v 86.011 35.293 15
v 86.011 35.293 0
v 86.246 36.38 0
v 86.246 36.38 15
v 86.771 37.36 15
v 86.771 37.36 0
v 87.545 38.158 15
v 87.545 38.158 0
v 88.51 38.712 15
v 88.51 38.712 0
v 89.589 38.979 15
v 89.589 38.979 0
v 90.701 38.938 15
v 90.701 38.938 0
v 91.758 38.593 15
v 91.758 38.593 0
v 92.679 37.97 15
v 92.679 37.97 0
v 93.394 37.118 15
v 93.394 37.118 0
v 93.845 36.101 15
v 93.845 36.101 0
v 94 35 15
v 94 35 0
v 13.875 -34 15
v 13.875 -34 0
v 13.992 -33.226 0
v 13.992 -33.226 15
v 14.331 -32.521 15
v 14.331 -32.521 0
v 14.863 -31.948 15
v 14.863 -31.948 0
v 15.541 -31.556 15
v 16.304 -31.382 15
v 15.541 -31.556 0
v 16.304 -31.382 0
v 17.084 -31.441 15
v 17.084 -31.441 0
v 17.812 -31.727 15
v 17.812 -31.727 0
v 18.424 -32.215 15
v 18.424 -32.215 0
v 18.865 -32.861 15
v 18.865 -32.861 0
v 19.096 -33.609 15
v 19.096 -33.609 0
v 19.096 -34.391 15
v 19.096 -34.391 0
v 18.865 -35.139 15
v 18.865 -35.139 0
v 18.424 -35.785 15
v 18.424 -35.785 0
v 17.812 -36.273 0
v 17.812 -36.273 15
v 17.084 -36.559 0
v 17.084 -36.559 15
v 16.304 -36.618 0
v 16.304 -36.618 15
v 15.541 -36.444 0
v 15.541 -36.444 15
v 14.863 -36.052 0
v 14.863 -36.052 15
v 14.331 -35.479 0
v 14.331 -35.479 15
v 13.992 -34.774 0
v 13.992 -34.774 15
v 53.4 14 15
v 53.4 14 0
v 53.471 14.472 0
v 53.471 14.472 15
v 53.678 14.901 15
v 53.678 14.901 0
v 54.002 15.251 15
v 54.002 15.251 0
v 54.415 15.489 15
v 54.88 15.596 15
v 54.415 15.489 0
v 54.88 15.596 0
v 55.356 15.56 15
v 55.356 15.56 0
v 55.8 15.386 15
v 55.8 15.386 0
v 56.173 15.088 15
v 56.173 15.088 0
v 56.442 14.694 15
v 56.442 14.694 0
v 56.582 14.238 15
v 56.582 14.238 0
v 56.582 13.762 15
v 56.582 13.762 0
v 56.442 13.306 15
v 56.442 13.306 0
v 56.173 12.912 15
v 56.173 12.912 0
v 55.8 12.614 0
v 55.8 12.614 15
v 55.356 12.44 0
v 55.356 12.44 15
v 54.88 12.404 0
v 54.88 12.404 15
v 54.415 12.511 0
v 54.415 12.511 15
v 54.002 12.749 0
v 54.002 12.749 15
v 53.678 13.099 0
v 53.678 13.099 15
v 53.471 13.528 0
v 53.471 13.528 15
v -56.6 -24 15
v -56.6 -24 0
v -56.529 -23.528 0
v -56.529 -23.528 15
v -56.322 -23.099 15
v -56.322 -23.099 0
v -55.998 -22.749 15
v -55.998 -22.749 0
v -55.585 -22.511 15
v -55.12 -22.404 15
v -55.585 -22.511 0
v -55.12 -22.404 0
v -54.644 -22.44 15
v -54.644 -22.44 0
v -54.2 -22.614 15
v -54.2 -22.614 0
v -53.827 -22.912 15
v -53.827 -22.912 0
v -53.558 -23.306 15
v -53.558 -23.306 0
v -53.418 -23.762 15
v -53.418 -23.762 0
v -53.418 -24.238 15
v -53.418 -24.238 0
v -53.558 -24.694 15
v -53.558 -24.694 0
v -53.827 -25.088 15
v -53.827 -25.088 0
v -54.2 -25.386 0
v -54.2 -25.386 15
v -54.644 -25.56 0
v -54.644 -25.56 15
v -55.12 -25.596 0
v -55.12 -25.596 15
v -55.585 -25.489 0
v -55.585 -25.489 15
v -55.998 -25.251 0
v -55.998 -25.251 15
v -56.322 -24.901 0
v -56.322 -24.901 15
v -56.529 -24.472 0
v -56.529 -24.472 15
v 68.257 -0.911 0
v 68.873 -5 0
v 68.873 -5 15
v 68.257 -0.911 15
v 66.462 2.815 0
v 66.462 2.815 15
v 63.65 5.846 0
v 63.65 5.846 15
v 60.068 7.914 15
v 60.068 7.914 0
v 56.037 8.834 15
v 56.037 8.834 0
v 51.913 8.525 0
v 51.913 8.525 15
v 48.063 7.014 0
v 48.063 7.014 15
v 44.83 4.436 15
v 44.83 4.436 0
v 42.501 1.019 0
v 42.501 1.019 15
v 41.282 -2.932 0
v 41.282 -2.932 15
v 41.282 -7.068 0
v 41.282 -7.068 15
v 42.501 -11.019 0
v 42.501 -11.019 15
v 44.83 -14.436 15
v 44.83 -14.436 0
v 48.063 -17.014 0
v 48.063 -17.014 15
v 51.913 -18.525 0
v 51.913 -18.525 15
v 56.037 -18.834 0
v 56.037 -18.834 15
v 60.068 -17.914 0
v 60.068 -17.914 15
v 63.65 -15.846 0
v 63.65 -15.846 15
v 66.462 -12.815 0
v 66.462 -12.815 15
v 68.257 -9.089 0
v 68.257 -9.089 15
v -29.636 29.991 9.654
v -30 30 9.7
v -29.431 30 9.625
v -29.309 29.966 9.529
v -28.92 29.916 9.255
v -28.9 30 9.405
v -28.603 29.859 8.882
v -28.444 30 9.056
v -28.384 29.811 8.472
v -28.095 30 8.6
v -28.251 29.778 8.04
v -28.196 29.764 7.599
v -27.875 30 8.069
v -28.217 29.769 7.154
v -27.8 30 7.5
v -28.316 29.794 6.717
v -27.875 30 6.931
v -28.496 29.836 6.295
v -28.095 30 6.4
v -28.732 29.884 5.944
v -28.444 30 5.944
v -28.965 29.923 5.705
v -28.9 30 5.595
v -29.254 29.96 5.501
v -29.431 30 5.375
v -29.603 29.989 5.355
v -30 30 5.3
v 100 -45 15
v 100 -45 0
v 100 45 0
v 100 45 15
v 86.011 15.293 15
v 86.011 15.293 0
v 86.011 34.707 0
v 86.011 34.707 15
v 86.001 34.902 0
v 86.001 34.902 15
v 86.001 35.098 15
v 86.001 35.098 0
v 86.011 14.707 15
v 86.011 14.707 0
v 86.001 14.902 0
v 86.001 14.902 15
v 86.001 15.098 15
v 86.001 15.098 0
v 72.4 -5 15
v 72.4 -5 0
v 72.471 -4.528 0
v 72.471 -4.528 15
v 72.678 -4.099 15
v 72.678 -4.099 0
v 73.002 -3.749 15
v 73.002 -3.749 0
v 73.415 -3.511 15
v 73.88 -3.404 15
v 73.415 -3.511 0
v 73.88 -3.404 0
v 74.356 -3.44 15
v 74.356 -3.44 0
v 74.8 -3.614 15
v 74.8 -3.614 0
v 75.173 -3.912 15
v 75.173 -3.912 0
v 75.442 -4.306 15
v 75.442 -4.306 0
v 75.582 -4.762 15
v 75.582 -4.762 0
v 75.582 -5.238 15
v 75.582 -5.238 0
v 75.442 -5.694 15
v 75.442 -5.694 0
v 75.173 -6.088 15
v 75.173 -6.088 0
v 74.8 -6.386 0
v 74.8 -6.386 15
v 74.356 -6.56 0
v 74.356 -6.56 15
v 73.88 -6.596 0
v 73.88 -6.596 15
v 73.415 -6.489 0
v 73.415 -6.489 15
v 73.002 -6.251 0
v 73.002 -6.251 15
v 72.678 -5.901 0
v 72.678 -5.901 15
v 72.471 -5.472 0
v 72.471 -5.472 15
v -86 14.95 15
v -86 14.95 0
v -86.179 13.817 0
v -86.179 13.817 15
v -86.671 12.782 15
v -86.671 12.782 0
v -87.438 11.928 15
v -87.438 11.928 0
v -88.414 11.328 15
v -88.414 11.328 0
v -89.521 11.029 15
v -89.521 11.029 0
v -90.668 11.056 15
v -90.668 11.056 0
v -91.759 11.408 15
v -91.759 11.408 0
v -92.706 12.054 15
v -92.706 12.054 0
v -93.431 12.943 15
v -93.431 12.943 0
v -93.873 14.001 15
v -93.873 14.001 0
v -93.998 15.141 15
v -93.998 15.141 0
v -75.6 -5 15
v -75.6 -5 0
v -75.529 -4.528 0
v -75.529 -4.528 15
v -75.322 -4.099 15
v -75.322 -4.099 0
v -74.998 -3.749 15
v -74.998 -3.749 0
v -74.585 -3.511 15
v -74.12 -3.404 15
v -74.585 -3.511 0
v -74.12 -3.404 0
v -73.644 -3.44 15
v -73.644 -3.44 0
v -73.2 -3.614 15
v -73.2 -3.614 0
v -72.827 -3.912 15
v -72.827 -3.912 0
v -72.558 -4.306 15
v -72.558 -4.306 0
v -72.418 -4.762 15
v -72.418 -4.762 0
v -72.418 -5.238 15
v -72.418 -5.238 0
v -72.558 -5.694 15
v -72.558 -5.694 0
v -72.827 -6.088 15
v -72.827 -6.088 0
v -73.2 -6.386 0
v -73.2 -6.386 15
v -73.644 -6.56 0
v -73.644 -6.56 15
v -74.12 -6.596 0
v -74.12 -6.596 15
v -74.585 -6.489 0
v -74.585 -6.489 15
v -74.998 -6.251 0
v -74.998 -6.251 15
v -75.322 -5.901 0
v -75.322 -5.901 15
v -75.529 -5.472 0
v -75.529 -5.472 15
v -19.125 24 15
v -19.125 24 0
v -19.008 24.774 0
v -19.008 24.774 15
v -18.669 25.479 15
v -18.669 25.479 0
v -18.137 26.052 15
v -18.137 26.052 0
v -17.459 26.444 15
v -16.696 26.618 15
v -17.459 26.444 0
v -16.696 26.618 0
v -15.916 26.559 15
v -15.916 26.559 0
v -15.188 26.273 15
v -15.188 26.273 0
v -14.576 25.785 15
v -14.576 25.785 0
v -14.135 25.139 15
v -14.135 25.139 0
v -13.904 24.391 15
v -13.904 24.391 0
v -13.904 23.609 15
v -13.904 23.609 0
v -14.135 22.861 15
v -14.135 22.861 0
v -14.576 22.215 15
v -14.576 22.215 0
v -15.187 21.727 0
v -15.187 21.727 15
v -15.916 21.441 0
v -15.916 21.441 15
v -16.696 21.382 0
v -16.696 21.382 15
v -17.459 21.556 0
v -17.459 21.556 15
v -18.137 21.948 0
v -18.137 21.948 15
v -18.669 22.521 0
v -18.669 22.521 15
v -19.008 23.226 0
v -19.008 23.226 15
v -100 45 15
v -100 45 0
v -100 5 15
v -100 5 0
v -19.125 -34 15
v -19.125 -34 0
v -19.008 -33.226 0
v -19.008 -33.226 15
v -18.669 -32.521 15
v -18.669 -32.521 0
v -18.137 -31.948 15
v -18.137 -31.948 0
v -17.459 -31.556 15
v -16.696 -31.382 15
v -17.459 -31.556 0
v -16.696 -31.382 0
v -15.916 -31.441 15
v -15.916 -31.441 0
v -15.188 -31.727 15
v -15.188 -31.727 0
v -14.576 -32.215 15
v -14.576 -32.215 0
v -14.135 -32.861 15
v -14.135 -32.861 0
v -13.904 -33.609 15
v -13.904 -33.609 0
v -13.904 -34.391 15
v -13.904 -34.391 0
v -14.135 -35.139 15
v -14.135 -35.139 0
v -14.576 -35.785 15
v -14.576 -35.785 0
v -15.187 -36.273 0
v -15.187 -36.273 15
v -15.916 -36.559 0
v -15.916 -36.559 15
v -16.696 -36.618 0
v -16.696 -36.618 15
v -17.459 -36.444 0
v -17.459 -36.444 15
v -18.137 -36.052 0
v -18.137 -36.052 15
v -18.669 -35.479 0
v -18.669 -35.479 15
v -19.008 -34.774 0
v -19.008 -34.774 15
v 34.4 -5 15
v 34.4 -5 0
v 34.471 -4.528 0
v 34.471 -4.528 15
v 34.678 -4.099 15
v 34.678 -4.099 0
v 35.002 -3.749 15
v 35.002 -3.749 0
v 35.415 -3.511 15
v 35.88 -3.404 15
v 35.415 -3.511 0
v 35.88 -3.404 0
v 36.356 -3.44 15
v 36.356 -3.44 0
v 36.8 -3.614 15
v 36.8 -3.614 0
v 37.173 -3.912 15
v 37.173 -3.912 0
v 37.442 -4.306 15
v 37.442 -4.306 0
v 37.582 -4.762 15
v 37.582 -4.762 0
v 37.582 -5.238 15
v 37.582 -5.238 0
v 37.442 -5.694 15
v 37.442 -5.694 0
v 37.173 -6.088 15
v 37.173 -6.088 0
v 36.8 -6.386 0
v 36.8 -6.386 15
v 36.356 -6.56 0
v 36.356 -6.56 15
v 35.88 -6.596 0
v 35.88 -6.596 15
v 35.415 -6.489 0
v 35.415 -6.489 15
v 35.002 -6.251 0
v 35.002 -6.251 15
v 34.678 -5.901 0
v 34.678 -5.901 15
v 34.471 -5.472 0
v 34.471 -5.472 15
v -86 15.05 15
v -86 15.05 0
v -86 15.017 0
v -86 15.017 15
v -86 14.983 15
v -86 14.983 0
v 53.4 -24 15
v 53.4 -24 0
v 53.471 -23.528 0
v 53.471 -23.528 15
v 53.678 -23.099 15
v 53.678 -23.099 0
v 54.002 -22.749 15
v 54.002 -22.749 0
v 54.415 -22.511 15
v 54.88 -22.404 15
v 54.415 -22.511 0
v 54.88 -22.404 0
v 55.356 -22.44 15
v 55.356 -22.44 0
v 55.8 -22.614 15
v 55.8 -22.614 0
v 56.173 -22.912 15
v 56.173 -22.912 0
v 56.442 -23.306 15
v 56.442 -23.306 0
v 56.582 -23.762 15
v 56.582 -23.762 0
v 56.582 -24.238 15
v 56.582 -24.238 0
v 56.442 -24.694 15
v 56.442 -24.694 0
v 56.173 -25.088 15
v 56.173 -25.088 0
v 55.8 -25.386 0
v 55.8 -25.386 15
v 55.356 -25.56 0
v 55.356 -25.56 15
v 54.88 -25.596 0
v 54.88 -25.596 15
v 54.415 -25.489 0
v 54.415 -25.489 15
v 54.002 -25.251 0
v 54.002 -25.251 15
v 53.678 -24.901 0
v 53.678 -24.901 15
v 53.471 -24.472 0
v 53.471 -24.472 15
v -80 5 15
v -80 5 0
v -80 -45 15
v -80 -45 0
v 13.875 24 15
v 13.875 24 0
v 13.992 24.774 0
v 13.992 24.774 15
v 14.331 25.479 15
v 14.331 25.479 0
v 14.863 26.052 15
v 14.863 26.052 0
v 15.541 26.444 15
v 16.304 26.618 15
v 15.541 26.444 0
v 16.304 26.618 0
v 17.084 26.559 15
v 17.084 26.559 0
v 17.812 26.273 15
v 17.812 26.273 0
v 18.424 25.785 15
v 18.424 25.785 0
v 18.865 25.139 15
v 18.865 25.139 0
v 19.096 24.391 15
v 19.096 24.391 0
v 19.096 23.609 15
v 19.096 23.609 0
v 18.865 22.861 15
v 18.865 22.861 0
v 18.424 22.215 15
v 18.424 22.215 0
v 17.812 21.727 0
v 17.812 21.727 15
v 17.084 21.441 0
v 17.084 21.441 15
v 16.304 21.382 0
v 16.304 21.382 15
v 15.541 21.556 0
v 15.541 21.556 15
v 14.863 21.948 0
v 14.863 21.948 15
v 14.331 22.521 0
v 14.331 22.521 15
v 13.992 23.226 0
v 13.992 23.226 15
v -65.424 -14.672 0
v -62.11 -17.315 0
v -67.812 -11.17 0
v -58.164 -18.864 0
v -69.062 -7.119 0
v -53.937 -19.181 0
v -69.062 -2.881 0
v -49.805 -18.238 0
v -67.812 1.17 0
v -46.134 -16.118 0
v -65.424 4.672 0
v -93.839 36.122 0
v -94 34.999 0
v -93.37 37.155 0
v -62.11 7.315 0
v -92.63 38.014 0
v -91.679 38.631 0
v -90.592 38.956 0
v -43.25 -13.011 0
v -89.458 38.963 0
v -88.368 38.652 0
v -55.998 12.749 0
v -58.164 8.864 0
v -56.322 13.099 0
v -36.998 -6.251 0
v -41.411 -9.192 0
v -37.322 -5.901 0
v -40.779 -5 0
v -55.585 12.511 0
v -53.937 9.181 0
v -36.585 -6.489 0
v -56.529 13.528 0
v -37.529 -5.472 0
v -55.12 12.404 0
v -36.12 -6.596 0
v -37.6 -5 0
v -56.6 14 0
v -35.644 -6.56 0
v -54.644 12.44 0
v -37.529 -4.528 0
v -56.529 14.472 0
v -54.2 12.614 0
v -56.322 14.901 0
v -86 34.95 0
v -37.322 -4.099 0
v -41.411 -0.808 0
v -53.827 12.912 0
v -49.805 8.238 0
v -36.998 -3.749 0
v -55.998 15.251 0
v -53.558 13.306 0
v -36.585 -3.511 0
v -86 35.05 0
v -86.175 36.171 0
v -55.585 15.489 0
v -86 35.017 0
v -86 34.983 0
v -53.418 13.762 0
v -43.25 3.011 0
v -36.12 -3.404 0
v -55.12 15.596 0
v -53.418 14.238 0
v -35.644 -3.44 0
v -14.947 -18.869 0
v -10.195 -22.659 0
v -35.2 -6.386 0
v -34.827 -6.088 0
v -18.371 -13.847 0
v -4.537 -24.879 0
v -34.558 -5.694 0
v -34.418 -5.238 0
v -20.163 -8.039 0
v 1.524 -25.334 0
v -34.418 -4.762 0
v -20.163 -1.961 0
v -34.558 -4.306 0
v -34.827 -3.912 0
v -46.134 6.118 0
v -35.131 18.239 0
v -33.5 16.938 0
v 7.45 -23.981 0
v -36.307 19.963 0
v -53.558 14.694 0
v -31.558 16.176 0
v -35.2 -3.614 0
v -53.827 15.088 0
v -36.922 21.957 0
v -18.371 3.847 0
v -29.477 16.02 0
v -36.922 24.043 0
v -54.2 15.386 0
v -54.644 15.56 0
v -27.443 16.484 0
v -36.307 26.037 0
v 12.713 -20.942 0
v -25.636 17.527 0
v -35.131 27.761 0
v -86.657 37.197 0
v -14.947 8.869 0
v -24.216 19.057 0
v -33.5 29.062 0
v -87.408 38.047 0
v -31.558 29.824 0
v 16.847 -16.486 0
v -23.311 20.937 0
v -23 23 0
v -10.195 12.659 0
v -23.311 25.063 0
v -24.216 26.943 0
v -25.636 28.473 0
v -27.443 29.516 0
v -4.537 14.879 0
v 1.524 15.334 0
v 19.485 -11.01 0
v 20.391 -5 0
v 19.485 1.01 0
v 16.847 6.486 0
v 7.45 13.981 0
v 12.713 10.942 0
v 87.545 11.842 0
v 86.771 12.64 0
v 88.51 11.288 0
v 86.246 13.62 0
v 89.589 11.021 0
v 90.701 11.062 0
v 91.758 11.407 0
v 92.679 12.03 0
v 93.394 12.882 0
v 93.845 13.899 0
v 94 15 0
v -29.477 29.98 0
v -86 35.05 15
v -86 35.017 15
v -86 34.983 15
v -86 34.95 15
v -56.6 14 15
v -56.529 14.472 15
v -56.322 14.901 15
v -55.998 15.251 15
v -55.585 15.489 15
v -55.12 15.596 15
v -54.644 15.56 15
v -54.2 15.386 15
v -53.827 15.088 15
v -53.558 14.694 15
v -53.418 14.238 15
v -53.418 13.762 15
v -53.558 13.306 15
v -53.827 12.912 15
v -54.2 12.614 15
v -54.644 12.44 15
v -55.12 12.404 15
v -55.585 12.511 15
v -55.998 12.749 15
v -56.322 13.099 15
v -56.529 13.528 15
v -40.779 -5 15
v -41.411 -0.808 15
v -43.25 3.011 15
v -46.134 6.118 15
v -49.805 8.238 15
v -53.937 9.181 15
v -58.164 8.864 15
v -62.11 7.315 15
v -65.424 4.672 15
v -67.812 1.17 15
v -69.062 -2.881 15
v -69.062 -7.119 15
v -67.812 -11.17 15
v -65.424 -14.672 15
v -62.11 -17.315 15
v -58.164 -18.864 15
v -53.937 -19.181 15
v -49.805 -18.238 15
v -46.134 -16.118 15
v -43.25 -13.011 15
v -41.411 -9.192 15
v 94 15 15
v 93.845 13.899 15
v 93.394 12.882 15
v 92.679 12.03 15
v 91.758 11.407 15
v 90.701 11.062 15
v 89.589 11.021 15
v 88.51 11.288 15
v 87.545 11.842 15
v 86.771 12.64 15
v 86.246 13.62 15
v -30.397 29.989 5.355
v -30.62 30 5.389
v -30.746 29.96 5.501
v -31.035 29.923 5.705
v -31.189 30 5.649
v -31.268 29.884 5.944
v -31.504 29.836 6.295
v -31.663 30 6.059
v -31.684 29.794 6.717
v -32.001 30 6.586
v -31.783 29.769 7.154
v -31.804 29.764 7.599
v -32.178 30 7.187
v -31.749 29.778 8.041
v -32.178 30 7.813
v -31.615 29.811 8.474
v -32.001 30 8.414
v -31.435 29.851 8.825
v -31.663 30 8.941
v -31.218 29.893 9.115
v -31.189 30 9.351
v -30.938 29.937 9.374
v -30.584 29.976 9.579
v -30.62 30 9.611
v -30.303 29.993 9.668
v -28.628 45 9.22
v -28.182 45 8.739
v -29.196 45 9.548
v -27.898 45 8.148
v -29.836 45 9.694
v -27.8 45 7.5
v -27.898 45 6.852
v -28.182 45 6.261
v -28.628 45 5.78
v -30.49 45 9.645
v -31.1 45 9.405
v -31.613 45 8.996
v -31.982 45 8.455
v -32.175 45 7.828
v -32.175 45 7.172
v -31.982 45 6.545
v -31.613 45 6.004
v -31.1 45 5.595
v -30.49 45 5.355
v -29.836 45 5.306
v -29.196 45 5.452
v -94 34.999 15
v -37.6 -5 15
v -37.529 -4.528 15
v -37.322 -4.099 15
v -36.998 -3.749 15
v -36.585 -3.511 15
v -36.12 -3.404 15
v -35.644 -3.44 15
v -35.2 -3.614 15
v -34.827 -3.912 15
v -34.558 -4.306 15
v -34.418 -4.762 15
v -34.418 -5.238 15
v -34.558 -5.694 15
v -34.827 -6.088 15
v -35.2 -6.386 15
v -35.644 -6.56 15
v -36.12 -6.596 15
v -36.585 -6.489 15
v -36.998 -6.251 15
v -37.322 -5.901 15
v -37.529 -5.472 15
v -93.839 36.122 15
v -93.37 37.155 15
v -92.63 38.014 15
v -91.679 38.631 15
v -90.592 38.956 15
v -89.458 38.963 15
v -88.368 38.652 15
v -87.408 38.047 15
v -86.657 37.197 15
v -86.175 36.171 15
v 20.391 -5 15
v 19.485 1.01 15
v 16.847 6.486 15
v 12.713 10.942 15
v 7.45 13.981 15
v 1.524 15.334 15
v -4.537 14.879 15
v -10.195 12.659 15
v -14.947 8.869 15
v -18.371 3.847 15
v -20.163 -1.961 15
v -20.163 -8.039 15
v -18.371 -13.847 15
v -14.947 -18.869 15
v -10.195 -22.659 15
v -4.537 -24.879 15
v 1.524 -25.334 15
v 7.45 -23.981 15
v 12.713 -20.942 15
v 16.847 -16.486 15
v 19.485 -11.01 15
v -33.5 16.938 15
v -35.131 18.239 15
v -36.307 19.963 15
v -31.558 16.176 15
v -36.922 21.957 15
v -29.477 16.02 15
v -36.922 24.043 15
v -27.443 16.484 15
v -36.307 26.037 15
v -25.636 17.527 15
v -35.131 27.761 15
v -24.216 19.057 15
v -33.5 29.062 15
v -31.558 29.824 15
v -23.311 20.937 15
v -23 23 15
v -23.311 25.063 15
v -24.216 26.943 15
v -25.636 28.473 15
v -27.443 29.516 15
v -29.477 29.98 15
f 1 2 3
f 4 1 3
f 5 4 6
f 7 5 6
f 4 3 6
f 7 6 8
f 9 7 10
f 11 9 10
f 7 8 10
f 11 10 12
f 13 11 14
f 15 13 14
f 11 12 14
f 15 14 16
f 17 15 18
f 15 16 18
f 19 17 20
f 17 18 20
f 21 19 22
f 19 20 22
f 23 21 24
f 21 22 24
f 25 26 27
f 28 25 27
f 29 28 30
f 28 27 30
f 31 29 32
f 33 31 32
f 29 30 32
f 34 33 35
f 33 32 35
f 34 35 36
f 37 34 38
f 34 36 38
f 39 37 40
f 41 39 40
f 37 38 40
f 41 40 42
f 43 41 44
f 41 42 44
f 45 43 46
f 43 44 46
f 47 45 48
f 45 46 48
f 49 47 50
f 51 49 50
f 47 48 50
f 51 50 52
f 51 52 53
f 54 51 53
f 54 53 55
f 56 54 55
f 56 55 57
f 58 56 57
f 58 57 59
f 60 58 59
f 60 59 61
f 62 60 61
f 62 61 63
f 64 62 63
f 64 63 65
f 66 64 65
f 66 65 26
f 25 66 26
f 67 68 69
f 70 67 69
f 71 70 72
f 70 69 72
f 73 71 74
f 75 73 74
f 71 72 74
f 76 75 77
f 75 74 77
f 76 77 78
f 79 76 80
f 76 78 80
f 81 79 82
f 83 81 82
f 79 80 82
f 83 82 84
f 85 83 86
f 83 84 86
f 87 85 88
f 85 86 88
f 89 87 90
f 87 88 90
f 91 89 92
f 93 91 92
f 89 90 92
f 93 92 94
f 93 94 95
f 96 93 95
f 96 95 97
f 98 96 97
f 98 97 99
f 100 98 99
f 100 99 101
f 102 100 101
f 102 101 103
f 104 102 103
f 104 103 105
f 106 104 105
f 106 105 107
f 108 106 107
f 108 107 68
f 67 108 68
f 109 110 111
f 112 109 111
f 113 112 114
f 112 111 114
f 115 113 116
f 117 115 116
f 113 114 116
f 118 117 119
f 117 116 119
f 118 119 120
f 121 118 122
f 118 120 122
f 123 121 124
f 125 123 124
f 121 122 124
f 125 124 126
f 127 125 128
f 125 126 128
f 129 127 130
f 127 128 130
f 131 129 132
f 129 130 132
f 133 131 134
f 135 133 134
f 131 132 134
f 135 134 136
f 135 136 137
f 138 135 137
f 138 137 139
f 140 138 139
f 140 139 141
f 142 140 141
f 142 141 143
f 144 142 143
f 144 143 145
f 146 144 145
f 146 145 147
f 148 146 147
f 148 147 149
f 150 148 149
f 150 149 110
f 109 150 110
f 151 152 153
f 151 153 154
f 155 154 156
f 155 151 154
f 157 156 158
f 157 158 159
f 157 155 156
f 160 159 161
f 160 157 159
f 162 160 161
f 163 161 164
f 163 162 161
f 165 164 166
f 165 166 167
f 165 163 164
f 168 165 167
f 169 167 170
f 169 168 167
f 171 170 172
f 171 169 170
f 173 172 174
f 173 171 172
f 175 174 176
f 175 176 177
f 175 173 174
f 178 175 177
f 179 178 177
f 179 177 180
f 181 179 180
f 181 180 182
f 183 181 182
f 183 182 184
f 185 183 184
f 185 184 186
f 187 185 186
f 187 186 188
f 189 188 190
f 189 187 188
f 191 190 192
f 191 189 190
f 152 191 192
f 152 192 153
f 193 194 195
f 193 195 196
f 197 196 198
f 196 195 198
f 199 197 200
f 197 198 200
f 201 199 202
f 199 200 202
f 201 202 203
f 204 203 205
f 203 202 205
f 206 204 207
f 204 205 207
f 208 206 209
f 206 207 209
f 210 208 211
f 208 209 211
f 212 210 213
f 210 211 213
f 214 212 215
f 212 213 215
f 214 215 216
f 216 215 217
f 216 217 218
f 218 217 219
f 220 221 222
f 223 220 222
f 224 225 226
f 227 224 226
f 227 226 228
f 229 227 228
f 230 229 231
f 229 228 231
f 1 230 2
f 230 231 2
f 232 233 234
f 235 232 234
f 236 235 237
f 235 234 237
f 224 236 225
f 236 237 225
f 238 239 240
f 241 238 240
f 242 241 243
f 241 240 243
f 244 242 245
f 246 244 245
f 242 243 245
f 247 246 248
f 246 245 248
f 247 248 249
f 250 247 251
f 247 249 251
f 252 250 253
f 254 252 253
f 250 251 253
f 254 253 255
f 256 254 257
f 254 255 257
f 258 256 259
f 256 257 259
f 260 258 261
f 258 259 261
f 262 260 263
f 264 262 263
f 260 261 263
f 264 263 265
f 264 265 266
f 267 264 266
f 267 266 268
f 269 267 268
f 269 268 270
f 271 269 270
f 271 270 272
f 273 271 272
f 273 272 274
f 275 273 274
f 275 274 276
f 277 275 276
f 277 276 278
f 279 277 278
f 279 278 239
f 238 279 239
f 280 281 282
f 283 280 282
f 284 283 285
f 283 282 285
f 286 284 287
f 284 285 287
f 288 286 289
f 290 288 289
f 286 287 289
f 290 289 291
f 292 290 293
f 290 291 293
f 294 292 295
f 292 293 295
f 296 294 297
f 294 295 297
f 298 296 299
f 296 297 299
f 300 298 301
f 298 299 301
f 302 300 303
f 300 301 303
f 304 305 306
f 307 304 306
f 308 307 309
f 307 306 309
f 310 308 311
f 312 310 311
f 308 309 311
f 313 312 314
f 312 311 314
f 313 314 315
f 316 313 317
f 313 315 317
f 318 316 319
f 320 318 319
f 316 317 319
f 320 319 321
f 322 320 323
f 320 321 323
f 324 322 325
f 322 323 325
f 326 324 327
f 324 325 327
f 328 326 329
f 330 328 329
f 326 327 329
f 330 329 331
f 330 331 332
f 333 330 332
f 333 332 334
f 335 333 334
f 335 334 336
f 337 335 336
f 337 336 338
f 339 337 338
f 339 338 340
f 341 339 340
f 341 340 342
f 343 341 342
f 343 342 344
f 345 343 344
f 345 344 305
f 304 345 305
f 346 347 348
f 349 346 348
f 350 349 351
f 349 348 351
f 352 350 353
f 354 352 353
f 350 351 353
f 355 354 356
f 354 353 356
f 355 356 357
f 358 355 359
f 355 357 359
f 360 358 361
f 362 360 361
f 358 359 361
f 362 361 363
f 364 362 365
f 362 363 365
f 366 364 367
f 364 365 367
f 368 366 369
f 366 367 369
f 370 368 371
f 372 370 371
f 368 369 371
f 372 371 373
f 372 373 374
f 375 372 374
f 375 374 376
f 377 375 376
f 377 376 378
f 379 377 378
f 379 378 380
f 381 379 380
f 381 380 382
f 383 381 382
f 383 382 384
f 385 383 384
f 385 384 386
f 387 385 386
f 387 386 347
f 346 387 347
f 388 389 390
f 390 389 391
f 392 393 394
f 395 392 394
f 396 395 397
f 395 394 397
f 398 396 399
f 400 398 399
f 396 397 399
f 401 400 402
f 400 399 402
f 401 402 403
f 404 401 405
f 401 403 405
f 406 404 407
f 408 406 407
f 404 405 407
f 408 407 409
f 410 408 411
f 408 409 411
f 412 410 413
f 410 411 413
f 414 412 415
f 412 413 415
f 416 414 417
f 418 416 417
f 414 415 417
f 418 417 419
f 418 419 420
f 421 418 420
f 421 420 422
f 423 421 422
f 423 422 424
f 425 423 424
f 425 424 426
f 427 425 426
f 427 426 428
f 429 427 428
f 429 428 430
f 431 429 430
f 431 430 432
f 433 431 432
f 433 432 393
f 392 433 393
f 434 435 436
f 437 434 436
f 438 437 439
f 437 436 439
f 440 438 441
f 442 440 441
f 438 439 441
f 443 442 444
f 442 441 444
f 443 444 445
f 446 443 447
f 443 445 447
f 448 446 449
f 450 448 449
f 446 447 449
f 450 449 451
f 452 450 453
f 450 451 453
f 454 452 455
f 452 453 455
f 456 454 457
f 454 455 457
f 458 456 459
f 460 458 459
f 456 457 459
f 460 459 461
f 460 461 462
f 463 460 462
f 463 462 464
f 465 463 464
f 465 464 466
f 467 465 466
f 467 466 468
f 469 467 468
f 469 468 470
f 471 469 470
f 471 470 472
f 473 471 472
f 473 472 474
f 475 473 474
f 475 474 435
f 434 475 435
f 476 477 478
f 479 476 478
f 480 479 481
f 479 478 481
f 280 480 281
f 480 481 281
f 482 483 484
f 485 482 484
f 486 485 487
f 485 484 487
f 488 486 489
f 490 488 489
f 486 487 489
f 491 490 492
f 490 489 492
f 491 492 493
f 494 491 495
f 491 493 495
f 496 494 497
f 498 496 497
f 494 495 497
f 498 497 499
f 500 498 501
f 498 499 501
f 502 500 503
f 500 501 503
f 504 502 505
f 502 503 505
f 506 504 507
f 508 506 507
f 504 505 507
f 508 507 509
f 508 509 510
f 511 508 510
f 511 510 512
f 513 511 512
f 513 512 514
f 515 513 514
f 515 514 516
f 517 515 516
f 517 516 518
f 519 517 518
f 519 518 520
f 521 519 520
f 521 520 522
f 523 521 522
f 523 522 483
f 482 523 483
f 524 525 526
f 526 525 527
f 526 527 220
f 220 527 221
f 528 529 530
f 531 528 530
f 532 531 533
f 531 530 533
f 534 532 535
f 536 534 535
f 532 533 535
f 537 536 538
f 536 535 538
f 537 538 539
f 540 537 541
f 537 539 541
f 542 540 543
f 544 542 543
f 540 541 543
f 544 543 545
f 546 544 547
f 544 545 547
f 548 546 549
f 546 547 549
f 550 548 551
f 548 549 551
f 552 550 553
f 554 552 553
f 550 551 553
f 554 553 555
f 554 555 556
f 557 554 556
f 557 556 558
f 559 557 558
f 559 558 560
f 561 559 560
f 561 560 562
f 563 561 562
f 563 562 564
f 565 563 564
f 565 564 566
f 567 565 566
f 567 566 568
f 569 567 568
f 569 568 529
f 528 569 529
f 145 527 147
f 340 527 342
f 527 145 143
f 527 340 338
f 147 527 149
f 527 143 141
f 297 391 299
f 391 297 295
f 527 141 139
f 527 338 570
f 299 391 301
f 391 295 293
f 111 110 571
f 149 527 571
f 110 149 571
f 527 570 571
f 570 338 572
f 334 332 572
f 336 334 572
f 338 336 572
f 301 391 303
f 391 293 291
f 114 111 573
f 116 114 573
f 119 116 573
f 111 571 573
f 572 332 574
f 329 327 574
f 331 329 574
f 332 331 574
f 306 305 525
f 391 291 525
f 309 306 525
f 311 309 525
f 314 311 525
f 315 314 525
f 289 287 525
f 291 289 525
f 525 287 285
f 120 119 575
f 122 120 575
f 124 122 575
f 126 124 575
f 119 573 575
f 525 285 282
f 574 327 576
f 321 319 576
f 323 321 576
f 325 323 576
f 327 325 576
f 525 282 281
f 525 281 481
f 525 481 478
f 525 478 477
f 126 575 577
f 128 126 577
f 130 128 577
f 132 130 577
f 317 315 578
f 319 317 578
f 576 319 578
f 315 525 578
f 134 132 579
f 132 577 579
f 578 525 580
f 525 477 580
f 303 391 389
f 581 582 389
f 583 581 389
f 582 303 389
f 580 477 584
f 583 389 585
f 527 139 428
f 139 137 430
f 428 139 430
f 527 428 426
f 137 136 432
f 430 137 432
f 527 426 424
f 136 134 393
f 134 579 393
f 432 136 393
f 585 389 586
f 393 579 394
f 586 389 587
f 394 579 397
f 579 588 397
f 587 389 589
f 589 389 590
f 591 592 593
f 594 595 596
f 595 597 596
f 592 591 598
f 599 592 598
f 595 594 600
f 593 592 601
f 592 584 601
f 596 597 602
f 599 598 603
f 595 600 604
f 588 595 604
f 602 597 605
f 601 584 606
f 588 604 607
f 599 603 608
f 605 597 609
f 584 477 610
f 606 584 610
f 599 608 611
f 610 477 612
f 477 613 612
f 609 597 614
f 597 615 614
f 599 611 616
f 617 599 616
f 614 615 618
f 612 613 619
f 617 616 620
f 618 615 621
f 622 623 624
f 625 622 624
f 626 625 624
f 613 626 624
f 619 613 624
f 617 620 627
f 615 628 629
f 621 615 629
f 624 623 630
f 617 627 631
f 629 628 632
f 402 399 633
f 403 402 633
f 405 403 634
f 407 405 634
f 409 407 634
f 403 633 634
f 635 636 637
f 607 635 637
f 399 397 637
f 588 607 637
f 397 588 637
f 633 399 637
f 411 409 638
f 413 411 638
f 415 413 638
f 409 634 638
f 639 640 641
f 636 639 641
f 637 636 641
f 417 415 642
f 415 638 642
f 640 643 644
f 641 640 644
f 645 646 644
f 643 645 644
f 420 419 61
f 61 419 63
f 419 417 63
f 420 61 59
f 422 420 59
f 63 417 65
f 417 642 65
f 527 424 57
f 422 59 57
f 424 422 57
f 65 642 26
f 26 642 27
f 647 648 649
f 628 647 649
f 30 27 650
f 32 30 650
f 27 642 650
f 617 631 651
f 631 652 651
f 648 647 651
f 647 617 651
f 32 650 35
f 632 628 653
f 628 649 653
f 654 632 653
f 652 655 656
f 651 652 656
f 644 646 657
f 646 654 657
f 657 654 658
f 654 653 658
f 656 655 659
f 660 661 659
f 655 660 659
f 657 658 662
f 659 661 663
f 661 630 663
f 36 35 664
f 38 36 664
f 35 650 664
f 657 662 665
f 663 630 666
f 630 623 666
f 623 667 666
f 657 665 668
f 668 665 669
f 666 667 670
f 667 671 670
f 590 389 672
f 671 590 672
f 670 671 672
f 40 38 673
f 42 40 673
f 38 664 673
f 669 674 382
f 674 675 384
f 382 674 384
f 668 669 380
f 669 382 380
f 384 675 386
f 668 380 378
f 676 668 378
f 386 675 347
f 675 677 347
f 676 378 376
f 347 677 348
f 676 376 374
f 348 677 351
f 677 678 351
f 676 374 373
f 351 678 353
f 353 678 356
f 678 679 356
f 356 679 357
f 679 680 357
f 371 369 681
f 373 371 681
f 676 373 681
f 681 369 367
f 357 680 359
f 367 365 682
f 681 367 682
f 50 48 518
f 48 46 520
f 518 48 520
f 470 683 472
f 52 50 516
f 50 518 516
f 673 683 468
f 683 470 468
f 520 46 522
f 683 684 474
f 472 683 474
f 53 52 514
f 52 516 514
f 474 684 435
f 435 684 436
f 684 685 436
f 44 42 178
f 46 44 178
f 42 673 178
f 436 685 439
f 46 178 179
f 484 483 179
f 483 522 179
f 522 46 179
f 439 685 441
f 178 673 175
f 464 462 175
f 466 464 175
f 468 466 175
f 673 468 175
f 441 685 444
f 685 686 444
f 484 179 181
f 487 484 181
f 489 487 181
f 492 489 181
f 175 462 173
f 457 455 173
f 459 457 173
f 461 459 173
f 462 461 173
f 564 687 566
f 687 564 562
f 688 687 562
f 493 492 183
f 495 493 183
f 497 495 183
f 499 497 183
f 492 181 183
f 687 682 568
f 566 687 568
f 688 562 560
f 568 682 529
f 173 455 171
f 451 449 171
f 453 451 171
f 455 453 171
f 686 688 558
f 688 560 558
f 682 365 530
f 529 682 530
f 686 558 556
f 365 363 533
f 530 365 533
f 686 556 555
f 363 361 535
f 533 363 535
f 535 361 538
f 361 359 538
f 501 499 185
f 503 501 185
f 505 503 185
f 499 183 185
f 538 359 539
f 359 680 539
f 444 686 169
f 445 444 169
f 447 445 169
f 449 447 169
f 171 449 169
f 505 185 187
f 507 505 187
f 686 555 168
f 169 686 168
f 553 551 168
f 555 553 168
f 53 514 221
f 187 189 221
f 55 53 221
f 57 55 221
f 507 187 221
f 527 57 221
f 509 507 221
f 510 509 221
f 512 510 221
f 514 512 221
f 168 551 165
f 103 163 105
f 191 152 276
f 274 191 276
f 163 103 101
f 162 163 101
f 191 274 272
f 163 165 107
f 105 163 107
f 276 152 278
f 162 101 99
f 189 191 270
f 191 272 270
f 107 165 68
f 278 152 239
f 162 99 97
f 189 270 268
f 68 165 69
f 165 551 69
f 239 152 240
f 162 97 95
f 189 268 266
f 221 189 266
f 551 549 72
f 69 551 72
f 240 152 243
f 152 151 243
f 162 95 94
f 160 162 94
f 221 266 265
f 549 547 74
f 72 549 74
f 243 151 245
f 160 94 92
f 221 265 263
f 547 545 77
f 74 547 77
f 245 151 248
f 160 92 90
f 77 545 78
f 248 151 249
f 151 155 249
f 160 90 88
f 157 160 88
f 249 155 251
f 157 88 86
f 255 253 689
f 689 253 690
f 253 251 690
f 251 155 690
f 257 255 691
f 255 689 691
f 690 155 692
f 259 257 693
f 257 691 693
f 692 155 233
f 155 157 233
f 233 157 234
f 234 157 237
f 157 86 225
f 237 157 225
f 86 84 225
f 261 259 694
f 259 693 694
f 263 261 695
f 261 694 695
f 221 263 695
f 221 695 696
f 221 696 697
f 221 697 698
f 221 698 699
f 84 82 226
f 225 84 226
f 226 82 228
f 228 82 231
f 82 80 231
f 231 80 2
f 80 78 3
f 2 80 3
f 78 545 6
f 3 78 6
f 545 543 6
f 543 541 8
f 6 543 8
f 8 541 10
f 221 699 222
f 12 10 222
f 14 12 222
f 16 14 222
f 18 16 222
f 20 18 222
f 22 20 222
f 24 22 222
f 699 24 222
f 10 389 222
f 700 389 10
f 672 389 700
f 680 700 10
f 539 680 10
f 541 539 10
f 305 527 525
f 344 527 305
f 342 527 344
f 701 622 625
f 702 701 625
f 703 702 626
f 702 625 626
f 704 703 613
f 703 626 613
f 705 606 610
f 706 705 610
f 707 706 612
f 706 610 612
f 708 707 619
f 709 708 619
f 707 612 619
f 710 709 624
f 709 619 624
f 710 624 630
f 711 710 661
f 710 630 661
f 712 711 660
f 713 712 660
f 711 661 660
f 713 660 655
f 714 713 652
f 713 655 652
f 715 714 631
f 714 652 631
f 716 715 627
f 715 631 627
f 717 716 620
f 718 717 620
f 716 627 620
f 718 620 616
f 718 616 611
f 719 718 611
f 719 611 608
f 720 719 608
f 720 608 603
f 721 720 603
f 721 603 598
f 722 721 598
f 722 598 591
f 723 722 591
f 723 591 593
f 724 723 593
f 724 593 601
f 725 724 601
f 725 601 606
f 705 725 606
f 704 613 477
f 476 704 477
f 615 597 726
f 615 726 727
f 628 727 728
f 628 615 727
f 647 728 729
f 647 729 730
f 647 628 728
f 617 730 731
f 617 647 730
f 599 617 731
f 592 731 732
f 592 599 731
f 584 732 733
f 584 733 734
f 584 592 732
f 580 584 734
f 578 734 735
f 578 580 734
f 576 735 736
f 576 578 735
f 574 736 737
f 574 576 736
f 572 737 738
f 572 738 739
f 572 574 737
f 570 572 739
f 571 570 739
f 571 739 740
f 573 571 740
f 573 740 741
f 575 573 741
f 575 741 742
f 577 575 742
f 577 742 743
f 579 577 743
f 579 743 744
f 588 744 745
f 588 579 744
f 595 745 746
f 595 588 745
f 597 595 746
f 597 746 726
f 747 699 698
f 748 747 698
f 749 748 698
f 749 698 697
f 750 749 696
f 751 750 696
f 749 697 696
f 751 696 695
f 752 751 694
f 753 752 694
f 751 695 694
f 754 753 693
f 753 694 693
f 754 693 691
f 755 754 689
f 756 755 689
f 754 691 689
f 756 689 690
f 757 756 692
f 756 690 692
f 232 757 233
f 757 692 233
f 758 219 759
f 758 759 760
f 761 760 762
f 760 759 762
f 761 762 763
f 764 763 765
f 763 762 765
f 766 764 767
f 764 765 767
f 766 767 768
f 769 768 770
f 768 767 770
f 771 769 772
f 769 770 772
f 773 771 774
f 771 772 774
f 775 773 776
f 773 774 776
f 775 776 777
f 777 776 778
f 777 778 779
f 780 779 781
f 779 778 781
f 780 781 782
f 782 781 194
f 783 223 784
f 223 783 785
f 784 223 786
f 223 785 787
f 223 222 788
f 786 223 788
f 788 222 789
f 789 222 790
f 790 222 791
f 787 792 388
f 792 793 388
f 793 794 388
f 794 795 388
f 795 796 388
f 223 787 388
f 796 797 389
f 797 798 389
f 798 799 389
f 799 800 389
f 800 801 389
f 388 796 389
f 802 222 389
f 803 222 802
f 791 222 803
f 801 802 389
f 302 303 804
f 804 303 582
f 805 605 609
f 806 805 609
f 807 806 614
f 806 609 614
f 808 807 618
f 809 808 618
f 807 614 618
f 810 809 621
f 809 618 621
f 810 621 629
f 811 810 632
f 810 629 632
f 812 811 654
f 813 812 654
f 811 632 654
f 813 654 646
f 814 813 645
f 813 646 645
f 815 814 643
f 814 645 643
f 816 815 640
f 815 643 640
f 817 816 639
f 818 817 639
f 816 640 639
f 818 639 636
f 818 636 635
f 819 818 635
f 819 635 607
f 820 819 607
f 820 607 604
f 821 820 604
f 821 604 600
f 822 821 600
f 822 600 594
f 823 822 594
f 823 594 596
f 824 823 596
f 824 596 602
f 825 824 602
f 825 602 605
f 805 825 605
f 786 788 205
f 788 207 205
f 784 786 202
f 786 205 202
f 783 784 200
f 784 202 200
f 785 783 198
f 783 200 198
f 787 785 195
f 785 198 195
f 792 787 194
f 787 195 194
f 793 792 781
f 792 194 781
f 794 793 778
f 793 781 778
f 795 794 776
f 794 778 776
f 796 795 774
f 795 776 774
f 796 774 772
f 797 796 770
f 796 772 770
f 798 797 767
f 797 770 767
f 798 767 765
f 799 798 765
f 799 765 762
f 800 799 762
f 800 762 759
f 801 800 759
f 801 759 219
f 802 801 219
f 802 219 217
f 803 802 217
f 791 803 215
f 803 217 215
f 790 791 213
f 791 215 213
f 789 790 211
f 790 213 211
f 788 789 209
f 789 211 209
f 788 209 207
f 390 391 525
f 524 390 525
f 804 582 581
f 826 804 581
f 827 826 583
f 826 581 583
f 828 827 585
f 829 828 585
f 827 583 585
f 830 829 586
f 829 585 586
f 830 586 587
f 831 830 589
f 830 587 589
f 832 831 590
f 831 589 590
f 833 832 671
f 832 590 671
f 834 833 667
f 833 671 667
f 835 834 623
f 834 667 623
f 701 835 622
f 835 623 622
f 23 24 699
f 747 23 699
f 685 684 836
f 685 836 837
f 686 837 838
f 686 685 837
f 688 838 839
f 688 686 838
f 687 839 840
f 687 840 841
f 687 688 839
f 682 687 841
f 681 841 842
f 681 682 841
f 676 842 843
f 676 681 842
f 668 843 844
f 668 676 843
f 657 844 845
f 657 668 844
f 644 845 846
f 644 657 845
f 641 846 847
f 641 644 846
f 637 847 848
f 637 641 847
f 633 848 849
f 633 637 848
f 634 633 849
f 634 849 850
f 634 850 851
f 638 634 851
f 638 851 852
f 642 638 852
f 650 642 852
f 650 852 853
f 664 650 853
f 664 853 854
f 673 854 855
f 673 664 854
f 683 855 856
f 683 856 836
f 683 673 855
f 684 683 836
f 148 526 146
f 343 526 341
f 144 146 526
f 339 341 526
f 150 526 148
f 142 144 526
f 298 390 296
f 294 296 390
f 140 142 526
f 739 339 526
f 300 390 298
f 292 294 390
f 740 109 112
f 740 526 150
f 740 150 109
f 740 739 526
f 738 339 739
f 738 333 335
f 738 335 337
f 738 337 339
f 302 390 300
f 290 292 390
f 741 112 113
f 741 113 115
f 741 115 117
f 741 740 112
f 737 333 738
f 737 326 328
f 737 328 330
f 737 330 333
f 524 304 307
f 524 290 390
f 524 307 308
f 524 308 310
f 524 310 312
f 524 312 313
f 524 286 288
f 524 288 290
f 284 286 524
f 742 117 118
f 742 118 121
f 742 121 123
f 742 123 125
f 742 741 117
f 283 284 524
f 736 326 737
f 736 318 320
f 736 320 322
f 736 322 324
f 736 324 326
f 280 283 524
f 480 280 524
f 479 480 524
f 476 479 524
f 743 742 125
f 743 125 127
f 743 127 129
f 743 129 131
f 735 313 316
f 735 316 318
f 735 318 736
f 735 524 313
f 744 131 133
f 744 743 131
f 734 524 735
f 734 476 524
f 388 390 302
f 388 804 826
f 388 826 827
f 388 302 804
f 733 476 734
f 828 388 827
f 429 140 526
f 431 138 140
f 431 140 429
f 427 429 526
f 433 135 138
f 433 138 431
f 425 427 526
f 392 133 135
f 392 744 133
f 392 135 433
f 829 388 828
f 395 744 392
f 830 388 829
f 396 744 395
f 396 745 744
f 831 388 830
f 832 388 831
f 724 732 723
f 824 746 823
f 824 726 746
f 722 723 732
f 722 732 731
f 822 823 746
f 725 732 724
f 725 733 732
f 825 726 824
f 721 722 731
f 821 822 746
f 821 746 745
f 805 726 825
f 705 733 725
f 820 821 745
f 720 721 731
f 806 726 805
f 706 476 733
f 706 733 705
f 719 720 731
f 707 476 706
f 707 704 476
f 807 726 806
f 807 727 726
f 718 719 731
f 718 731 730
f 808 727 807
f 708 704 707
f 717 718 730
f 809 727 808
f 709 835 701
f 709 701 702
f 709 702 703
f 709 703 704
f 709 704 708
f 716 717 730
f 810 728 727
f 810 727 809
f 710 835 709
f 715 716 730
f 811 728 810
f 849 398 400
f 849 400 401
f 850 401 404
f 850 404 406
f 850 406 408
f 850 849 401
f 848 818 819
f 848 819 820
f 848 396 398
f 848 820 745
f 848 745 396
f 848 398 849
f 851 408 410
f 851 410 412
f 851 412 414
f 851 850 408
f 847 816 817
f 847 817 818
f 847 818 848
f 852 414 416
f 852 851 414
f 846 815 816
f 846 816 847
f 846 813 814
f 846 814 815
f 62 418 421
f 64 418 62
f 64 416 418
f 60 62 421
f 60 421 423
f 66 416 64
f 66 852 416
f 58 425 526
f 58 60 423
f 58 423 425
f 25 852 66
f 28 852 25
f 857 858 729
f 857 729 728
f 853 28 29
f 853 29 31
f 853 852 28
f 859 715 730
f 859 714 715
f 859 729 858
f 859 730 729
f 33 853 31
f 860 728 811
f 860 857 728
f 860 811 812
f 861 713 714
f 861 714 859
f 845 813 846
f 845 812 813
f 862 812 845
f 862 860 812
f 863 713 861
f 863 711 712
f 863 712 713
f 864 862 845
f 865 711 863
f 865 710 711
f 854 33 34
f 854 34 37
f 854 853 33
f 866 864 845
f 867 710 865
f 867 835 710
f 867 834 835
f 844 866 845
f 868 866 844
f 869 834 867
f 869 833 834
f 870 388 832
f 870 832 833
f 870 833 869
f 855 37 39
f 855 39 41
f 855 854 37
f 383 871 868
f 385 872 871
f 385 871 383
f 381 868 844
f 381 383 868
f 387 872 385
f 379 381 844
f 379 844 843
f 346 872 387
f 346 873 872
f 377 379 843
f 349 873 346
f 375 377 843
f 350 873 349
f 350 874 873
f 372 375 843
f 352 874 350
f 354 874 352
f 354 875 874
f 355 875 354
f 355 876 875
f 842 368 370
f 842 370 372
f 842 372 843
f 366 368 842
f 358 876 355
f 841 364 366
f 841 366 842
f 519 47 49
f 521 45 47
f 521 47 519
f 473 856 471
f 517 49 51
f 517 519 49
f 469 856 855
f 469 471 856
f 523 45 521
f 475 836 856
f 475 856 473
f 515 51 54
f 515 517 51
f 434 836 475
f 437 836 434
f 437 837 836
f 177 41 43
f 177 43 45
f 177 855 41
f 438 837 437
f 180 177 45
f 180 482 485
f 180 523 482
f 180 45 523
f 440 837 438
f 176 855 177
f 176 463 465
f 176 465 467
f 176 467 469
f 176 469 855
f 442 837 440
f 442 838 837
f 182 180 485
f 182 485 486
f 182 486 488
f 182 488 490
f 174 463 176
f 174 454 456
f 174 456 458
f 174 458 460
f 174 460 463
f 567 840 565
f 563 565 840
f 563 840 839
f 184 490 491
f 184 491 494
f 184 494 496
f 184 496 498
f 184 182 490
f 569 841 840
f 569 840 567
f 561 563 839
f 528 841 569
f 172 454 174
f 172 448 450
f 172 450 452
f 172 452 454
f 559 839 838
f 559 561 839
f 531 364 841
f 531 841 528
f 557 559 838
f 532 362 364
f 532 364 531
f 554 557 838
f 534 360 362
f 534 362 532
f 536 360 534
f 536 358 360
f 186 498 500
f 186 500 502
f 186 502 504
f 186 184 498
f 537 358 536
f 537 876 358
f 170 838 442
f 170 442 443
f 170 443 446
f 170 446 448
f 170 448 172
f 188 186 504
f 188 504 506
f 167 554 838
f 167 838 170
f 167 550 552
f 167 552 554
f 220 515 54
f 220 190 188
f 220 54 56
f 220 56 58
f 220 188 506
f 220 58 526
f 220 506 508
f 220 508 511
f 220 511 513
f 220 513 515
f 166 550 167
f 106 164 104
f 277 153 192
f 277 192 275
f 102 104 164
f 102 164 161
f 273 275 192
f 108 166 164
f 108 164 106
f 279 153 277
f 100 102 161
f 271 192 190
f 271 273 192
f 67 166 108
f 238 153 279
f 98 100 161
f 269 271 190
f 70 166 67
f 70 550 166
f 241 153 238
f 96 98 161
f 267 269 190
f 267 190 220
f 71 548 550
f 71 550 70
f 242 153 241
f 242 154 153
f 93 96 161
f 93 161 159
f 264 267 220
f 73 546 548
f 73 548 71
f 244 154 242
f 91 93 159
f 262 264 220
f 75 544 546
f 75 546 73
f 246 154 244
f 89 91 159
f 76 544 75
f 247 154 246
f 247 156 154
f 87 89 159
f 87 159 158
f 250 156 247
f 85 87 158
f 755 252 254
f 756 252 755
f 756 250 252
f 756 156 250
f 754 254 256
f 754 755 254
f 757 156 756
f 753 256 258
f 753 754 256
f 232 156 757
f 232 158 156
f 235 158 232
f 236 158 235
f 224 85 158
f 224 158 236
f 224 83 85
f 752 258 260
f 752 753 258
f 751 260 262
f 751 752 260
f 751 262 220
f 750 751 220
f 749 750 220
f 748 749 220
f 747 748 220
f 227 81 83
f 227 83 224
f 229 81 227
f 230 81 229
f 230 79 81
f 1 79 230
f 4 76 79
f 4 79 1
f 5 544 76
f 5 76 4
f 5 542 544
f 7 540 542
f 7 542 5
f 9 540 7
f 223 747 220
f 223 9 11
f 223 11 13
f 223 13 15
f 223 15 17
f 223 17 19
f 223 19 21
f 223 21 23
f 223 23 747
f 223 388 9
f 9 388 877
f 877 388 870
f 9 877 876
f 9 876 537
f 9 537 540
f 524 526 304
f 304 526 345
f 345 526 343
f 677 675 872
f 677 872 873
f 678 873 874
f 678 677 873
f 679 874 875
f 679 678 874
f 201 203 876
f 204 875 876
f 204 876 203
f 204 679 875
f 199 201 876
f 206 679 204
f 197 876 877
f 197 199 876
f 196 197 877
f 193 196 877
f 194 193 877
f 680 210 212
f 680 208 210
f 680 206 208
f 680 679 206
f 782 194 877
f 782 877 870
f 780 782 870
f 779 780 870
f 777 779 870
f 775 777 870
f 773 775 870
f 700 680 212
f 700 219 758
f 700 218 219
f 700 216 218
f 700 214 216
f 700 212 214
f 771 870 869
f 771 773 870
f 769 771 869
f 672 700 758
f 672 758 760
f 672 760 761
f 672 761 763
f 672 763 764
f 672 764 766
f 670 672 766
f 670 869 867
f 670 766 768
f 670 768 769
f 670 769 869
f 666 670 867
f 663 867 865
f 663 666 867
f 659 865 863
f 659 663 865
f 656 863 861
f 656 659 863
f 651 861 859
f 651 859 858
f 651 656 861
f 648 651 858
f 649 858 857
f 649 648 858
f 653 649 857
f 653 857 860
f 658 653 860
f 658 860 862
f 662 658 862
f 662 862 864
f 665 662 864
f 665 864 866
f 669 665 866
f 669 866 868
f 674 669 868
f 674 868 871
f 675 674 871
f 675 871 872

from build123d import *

# Parameters (mm, degrees)
F0_R     = 14.2206342646
F0_R_2   = 20.3905424102
F0_R_3   = 13.8730620626
F0_R_4   = 7
F1_DEPTH = 15
F3_D     = 3.2
F5_D     = 5.25
F7_D     = 4.4
F7_DEPTH = 15
F7_TIP   = 1.3218933619


with BuildPart() as f1:
    # F0 (on Top) → F1 (new body)
    with BuildSketch(Plane.XY):
        Polygon((-80, -45), (100, -45), (100, 45), (-100, 45), (-100, 5), (-80, 5), align=None)
        with Locations((-55, -5)):
            Circle(F0_R, mode=Mode.SUBTRACT)
        with Locations((0, -5)):
            Circle(F0_R_2, mode=Mode.SUBTRACT)
        with Locations((55, -5)):
            Circle(F0_R_3, mode=Mode.SUBTRACT)
        with BuildLine():
            ThreePointArc((-86.0003137523, 35.0500990994), (-86, 35), (-86.0003137523, 34.9499009006))
            Line((-86.0003137523, 34.9499009006), (-86.0003137523, 15.0500990994))
            ThreePointArc((-86.0003137523, 15.0500990994), (-86, 15), (-86.0003137523, 14.9499009006))
            ThreePointArc((-86.0003137523, 14.9499009006), (-90.095653532, 11.0011438633), (-93.9975072002, 15.1411955542))
            Line((-93.9975072002, 15.1411955542), (-93.9999999685, 34.9994978889))
            ThreePointArc((-93.9999999685, 34.9994978889), (-90.0253010915, 38.999919981), (-86.0003137523, 35.0500990994))
        make_face(mode=Mode.SUBTRACT)
        with Locations((-30, 23)):
            Circle(F0_R_4, mode=Mode.SUBTRACT)
        with BuildLine():
            ThreePointArc((86.0107341117, 35.2928441091), (90.1465203854, 38.9973155713), (94, 35))
            Line((94, 35), (94, 15))
            ThreePointArc((94, 15), (90.1465203854, 11.0026844287), (86.0107341117, 14.7071558909))
            ThreePointArc((86.0107341117, 14.7071558909), (86, 15), (86.0107341117, 15.2928441091))
            Line((86.0107341117, 15.2928441091), (86.0107341117, 34.7071558909))
            ThreePointArc((86.0107341117, 34.7071558909), (86, 35), (86.0107341117, 35.2928441091))
        make_face(mode=Mode.SUBTRACT)
    extrude(amount=F1_DEPTH)

    # F3 (through all)
    with Locations(Plane.XY.offset(15)):
        with Locations((-74, -5), (-55, 14), (-36, -5), (-55, -24), (36, -5), (55, 14), (74, -5), (55, -24)):
            Hole(F3_D / 2)

    # F5 (through all)
    with Locations(Plane.XY.offset(15)):
        with Locations((-16.5, 24), (16.5, 24), (16.5, -34), (-16.5, -34)):
            Hole(F5_D / 2)

    # F7
    with Locations(Plane(origin=(0, 45, 0), x_dir=(-1, 0, 0), z_dir=(0, 1, 0))):
        with Locations((30, 7.5)):
            Hole(F7_D / 2, depth=F7_DEPTH)
            with Locations((0, 0, -(F7_DEPTH + F7_TIP / 2))):  # 118° drill point
                Cone(0, F7_D / 2, F7_TIP, mode=Mode.SUBTRACT)


solid = f1.part
